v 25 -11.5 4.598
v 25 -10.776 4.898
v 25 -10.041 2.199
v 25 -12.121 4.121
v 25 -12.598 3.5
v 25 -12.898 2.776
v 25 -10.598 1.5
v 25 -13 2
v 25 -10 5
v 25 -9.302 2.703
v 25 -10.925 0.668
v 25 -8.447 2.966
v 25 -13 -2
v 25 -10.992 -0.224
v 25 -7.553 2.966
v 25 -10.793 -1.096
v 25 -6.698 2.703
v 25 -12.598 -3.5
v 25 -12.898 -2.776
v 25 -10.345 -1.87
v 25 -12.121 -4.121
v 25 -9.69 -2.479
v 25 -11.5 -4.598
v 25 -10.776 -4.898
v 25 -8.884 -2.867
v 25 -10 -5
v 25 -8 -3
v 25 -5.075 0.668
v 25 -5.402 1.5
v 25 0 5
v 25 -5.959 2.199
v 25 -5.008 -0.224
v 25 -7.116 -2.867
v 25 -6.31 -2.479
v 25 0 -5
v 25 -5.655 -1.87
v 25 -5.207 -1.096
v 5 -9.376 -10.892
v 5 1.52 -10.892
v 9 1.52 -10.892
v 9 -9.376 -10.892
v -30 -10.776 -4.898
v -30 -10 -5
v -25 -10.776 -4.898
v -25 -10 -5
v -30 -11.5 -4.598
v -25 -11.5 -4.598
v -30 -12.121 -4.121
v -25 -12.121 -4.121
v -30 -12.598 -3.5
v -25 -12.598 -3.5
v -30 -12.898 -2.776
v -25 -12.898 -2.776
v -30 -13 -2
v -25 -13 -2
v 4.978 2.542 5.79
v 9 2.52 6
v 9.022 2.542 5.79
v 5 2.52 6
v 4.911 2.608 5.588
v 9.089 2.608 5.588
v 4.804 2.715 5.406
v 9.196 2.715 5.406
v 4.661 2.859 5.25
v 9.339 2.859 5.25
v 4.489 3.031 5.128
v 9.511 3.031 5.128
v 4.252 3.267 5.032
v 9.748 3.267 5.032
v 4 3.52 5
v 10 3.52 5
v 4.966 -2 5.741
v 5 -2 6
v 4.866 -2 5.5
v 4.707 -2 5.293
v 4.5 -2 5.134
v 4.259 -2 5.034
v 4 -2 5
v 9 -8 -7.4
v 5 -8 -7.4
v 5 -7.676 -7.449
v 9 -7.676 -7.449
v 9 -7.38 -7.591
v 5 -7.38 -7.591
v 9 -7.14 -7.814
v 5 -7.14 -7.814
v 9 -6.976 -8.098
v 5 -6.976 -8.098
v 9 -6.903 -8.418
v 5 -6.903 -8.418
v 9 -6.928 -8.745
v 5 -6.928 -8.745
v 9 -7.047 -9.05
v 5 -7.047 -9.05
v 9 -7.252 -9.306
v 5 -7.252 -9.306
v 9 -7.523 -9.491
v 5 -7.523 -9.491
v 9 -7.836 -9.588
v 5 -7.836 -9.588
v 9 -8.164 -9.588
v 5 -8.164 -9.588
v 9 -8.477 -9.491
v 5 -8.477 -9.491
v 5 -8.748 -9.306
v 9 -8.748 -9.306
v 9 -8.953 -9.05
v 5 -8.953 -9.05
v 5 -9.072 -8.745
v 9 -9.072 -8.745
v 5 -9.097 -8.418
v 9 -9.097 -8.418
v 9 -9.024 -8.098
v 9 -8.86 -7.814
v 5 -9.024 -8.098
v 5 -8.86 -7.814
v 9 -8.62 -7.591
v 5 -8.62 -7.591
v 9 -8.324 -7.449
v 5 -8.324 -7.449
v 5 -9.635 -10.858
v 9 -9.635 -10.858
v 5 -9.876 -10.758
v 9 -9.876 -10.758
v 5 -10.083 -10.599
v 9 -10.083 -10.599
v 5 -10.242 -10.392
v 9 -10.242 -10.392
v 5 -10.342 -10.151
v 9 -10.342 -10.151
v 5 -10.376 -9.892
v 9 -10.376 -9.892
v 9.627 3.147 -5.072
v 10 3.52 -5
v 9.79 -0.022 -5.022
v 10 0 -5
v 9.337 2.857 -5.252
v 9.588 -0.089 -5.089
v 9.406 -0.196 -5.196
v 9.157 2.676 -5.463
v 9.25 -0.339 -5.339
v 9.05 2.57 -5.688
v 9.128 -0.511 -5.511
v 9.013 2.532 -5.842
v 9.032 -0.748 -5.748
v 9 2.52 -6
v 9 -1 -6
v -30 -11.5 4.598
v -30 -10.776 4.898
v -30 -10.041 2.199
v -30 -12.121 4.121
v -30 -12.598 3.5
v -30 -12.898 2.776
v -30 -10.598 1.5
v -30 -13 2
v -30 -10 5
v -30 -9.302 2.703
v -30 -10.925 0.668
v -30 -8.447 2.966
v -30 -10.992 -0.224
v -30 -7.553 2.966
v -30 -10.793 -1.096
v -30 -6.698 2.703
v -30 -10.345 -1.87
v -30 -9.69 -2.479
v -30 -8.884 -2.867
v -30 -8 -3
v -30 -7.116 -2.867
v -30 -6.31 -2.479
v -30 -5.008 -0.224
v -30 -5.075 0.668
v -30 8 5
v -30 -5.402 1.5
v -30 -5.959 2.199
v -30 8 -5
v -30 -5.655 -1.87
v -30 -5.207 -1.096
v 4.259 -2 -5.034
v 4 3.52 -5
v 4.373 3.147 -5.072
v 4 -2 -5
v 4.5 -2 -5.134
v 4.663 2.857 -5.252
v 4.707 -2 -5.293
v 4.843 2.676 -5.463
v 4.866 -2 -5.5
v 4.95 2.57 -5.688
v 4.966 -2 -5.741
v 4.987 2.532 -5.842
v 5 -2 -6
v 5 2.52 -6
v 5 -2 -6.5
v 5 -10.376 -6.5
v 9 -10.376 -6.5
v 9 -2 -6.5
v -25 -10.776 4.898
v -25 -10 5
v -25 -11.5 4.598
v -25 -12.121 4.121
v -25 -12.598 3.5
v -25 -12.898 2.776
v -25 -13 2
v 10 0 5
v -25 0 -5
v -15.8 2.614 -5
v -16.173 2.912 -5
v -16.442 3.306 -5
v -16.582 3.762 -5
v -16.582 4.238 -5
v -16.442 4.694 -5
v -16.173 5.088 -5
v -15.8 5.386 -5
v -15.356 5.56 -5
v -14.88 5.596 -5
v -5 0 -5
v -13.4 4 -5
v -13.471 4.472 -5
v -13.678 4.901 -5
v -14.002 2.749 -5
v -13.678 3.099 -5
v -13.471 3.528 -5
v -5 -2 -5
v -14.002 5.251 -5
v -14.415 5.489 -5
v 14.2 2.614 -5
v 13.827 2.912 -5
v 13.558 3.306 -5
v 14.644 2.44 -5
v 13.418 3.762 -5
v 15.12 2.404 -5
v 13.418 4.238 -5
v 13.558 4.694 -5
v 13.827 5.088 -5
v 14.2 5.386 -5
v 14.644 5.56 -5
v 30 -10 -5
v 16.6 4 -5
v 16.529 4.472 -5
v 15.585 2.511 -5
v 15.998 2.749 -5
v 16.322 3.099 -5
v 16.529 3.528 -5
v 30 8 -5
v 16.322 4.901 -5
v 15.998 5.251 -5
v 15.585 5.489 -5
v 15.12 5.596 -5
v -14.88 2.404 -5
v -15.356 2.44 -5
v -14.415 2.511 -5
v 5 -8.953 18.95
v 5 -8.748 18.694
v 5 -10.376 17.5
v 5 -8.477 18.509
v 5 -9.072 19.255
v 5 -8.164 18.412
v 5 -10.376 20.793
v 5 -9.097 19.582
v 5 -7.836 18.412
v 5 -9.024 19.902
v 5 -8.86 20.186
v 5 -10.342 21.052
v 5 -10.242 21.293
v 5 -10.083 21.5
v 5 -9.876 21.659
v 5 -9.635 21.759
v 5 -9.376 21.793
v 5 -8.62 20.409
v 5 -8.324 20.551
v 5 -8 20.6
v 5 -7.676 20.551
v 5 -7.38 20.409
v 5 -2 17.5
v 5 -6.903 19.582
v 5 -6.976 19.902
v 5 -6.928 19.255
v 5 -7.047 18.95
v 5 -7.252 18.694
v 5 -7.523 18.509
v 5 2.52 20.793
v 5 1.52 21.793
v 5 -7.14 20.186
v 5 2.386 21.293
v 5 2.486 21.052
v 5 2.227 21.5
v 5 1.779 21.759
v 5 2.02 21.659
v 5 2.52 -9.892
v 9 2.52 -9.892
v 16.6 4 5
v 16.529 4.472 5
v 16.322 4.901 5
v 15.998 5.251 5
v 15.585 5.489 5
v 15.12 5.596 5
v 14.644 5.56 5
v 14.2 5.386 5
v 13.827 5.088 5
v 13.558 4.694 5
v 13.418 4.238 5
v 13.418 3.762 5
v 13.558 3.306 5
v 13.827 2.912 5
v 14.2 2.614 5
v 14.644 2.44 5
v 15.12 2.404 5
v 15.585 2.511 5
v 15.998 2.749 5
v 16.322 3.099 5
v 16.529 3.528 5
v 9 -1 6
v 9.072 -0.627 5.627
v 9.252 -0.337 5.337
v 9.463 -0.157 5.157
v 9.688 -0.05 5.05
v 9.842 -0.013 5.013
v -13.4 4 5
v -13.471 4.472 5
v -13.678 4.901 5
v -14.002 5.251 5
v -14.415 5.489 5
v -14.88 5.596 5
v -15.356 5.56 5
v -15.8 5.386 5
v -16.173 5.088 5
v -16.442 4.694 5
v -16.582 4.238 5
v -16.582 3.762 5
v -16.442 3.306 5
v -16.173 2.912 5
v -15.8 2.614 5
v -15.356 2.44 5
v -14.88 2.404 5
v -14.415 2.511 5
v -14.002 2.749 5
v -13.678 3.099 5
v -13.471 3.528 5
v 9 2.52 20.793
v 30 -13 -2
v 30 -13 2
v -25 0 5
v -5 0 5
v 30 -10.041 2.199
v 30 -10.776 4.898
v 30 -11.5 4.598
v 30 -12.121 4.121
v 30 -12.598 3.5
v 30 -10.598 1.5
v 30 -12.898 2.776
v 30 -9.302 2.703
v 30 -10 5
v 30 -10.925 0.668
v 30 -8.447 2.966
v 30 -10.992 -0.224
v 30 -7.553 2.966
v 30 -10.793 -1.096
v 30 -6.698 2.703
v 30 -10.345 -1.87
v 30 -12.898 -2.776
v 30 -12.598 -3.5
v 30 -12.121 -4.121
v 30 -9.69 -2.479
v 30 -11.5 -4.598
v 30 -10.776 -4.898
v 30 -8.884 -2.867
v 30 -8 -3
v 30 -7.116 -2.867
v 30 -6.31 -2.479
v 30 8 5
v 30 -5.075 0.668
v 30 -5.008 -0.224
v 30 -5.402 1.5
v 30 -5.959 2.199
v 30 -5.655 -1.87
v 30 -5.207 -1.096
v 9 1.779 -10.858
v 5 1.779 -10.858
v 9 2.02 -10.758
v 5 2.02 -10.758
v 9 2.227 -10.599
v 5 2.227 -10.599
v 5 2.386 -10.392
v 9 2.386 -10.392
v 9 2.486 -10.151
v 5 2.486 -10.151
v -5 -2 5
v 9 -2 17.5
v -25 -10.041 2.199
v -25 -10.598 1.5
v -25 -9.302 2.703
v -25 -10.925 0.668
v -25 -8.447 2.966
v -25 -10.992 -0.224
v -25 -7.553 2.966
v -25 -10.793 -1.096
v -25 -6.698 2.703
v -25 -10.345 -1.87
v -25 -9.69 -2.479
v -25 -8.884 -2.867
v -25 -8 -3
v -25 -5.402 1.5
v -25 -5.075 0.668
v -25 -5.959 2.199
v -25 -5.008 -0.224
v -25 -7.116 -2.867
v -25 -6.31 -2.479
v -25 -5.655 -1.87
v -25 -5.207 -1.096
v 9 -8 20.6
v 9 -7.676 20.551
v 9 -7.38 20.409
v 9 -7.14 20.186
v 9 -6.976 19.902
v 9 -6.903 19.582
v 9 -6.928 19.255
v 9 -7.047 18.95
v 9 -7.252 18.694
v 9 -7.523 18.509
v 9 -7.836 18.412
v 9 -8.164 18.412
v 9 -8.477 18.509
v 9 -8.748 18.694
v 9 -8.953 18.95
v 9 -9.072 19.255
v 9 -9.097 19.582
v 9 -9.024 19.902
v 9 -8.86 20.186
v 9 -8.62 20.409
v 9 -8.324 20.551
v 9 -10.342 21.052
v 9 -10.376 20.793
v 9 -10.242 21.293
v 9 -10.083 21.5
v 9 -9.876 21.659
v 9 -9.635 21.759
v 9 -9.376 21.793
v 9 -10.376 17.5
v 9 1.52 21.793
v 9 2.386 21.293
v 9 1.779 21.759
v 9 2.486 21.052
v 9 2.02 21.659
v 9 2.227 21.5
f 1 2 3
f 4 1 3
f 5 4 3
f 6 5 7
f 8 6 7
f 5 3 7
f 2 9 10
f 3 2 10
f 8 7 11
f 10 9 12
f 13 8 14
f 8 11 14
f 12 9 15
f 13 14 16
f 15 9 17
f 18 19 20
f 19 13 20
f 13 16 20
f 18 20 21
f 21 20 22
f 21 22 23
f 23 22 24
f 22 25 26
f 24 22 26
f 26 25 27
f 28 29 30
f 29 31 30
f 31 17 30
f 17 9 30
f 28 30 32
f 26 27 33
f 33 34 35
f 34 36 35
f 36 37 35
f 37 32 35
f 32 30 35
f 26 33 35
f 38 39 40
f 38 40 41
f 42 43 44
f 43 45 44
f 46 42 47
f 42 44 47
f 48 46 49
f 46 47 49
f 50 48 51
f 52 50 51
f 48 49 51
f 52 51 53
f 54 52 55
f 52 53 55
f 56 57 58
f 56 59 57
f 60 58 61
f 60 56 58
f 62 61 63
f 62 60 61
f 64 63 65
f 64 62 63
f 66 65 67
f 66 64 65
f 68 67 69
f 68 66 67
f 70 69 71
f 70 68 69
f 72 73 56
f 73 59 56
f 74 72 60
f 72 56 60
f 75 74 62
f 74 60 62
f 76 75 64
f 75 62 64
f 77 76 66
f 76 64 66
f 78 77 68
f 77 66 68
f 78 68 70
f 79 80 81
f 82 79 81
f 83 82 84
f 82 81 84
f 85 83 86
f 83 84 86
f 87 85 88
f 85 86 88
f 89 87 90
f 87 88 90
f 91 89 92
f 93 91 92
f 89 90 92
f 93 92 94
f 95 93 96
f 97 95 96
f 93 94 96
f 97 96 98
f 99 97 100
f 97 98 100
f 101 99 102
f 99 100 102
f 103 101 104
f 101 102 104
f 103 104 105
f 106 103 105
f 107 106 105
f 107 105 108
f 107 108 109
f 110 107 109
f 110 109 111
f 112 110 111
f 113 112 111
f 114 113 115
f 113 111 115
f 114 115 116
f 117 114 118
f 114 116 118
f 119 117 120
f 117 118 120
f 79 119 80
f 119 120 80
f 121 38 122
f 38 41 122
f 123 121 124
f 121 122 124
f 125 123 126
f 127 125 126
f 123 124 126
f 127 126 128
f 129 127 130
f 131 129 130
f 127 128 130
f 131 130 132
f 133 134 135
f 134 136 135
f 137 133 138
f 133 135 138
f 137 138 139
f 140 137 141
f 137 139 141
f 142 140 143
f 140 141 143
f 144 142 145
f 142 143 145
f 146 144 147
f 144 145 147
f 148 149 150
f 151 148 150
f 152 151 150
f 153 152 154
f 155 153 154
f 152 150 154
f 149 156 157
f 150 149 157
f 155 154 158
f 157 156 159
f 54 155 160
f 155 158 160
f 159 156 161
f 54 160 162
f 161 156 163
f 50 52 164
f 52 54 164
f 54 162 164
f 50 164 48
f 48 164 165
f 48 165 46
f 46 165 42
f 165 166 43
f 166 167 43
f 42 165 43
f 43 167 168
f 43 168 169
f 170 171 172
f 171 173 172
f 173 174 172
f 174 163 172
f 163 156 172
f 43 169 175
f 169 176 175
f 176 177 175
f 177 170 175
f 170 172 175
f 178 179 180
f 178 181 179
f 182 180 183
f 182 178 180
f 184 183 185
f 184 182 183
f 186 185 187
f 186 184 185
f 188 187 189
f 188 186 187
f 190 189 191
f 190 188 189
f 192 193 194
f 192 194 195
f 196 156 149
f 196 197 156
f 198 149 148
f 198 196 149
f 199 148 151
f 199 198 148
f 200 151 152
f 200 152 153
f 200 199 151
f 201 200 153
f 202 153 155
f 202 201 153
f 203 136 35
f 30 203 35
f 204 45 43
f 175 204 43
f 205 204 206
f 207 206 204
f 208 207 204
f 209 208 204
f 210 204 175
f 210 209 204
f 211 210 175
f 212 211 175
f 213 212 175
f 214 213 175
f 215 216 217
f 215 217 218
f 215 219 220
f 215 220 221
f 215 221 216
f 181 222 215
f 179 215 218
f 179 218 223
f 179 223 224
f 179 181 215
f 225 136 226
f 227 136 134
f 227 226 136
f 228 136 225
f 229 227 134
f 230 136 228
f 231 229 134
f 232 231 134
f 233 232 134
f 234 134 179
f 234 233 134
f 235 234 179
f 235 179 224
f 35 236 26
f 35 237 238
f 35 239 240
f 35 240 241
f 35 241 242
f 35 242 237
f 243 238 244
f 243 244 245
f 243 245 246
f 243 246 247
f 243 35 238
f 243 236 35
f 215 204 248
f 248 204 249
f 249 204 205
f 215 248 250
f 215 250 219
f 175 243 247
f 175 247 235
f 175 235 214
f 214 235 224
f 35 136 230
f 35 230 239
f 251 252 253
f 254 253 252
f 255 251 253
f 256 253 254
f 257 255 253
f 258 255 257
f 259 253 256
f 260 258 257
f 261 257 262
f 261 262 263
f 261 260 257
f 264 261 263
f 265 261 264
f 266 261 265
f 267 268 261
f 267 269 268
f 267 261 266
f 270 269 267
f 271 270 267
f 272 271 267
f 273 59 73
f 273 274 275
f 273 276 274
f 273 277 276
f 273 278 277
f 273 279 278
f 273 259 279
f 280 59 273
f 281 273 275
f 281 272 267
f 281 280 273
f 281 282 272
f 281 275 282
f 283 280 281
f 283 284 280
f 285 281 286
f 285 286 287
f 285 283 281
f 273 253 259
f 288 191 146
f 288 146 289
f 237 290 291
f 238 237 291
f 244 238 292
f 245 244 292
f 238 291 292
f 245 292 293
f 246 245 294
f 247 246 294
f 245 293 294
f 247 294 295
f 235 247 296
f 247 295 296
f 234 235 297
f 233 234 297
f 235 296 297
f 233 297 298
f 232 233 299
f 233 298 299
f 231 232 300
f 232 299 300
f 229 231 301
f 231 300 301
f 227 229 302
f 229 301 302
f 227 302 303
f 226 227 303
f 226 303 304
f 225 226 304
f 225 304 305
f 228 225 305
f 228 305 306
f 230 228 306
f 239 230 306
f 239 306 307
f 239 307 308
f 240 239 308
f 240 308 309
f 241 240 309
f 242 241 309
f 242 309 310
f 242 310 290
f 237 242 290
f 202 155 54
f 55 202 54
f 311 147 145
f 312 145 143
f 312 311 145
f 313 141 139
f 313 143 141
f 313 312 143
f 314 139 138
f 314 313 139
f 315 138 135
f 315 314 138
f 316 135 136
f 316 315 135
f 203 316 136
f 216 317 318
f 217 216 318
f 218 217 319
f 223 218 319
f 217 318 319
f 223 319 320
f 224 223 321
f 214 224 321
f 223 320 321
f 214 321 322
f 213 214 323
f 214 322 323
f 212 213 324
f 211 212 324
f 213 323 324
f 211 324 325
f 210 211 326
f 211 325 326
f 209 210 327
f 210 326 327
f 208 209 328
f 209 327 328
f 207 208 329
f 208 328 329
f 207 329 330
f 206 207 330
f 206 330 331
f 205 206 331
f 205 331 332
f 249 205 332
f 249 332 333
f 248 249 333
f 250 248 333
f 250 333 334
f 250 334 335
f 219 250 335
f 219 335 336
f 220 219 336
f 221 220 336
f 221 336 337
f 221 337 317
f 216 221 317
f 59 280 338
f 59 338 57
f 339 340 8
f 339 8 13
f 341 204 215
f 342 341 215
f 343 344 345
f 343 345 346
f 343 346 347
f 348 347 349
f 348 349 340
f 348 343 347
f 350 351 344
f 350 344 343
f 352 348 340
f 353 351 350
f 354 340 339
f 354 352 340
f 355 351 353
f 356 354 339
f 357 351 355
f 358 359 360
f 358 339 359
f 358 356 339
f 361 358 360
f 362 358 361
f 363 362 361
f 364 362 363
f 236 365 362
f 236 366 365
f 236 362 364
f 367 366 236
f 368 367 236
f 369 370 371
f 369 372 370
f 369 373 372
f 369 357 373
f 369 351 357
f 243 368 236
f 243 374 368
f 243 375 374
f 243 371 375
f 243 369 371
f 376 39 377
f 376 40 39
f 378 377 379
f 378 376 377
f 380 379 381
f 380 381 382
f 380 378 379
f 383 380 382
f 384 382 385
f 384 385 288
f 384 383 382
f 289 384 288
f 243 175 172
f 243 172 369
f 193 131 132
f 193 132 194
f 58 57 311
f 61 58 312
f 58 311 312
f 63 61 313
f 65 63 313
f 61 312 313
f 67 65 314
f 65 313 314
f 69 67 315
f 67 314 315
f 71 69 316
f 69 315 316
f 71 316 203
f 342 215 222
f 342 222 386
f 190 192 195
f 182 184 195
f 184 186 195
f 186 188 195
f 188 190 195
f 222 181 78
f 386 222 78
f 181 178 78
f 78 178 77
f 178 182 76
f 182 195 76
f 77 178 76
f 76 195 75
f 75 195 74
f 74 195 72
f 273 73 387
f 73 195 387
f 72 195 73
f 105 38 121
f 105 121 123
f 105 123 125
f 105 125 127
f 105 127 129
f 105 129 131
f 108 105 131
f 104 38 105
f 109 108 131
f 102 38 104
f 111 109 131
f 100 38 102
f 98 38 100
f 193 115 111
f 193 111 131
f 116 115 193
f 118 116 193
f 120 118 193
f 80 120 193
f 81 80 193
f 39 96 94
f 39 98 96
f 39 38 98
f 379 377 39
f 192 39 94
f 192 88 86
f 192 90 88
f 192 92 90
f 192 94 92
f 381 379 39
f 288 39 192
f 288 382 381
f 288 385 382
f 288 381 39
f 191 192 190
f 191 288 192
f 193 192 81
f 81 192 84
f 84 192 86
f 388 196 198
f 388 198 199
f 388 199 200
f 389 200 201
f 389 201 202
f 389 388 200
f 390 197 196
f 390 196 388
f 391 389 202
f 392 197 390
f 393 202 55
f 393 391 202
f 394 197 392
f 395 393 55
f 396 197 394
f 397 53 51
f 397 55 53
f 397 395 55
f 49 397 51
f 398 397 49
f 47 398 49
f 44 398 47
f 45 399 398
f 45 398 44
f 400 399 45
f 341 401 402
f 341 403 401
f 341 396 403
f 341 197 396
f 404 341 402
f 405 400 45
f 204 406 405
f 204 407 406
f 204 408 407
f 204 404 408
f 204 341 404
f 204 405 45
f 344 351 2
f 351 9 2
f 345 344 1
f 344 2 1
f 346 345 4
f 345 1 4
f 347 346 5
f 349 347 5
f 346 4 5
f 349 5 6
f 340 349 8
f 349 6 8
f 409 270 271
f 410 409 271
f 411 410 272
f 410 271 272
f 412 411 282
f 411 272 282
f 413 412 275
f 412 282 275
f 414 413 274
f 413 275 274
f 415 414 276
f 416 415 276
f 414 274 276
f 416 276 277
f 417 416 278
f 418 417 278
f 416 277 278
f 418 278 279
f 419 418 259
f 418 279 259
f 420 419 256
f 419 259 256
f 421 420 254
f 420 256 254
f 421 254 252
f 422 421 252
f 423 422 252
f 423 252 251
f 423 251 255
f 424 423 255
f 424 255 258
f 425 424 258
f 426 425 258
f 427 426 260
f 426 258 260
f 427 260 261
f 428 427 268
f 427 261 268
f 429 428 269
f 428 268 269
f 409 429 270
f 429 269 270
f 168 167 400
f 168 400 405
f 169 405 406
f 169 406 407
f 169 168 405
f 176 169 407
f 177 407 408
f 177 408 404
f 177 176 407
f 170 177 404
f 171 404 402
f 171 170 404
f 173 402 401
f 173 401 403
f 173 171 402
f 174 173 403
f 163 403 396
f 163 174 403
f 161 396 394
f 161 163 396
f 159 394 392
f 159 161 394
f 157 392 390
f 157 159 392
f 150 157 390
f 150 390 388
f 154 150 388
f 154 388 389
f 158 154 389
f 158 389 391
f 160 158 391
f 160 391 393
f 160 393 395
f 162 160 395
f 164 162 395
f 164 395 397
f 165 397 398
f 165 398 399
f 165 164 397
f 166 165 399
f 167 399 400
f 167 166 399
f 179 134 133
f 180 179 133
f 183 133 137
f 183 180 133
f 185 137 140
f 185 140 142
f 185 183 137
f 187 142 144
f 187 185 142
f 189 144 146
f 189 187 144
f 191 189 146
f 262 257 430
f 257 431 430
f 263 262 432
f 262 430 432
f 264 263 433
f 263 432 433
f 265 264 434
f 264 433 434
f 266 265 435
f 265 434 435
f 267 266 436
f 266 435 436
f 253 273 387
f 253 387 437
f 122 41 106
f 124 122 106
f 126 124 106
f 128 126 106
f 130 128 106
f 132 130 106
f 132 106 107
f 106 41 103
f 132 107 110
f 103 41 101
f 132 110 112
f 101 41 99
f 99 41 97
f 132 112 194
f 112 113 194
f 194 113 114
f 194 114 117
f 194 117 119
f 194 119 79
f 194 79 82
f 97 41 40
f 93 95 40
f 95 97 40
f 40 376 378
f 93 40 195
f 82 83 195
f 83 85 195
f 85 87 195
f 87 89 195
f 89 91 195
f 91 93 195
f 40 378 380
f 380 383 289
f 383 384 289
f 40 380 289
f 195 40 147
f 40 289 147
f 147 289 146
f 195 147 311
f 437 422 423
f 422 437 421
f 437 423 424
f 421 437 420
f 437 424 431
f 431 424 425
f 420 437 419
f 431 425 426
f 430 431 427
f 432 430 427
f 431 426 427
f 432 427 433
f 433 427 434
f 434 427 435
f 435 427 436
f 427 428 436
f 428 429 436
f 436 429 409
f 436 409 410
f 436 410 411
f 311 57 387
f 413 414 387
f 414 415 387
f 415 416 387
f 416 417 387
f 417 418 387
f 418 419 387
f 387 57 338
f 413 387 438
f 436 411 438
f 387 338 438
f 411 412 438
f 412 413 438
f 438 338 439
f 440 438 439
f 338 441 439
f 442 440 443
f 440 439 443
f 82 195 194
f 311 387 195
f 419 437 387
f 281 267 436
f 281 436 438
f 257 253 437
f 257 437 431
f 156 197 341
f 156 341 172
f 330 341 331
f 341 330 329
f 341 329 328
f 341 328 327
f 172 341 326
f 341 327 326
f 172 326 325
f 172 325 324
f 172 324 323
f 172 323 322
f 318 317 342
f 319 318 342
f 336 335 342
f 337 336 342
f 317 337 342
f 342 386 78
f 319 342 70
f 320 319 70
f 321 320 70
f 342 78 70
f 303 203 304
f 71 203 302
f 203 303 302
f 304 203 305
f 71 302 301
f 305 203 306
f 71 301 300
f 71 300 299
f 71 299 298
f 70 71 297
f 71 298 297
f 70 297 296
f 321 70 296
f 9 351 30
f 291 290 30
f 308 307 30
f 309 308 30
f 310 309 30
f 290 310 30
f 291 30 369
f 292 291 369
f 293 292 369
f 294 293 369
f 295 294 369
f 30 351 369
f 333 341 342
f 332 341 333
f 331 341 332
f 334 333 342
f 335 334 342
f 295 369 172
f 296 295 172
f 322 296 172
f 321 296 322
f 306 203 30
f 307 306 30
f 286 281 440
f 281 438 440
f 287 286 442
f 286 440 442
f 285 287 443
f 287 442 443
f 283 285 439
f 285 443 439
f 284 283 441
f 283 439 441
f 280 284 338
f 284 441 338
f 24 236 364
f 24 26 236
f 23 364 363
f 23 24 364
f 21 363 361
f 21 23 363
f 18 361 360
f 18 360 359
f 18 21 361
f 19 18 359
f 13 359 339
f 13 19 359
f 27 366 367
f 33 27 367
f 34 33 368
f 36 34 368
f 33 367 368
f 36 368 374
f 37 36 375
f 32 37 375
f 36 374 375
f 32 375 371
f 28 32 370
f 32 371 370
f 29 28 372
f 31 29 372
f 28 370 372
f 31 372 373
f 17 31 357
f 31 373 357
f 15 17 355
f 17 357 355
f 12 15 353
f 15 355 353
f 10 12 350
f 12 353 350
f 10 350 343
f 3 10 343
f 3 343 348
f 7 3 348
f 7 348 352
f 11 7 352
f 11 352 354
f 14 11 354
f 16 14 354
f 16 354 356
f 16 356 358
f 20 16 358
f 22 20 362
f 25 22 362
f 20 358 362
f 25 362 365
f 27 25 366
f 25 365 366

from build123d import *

# Parameters (mm, degrees)
SKETCH_1_W               = 60
SKETCH_1_H               = 10
EXTRUDE_1_DEPTH          = 8
SKETCH_2_W               = 10
SKETCH_2_H               = 21
SKETCH_2_R               = 3
EXTRUDE_2_DEPTH          = 5
FILLET_1_R               = 3
SKETCH_3_R               = 1.1
EXTRUDE_3_DEPTH          = 4
SKETCH_5_W               = 10
SKETCH_5_H               = 2
EXTRUDE_4_DEPTH          = 10
FILLET_4_R               = 1
SKETCH_4_R               = 1.6
CUT_EXTRUDE_1_DEPTH      = 17.792928464
CUT_EXTRUDE_1_DEPTH_BACK = 16.892331711


with BuildPart() as part:
    # 草图1 → 凸台-拉伸1 (new body)
    with BuildSketch(Plane(origin=(0, 0, 0), x_dir=(1, 0, 0), z_dir=(0, 1, 0))):
        Rectangle(SKETCH_1_W, SKETCH_1_H)
    extrude(amount=EXTRUDE_1_DEPTH)

    # 草图2 → 凸台-拉伸2 (add)
    with BuildSketch(Plane(origin=(30, 0, 0), x_dir=(0, 0, -1), z_dir=(1, 0, 0))):
        with Locations((0, -2.5)):
            Rectangle(SKETCH_2_W, SKETCH_2_H)
        with Locations((0, -8)):
            Circle(SKETCH_2_R, mode=Mode.SUBTRACT)
    extrude_2 = extrude(amount=-EXTRUDE_2_DEPTH)

    # 镜向1: 凸台-拉伸2 across plane
    add(extrude_2.mirror(Plane(origin=(0, 0, 0), x_dir=(0, 0, 1), z_dir=(1, 0, 0))))

    # 圆角1
    fillet_1_edges = [part.edges().sort_by_distance(p)[0] for p in [
        (27.5, -13, 5),
        (27.5, -13, -5),
        (-27.5, -13, -5),
        (-27.5, -13, 5),
    ]]
    fillet(fillet_1_edges, radius=FILLET_1_R)

    # 草图3 → 凸台-拉伸3 (add)
    with BuildSketch(Plane.ZY.offset(-5)):
        Polygon((-6.5, -2), (17.5, -2), (17.5, -8), (17.5, -10.376383694), (21.792928464, -10.376383694), (21.792928464, 2.519827065), (-10.892331711, 2.519827065), (-10.892331711, -10.376383694), (-6.5, -10.376383694), (-6.5, -8), align=None)
        with Locations((-8.5, -8)):
            Circle(SKETCH_3_R, mode=Mode.SUBTRACT)
        with Locations((19.5, -8)):
            Circle(SKETCH_3_R, mode=Mode.SUBTRACT)
    extrude(amount=-EXTRUDE_3_DEPTH)

    # 草图5 → 凸台-拉伸4 (add)
    with BuildSketch(Plane.ZY.offset(-5)):
        with Locations((0, -1)):
            Rectangle(SKETCH_5_W, SKETCH_5_H)
    extrude(amount=EXTRUDE_4_DEPTH)

    # 圆角4
    fillet_4_edges = [part.edges().sort_by_distance(p)[0] for p in [
        (5, 0.259913532, -5),
        (7, 2.519827065, -5),
        (9, 1.259913532, -5),
        (7, 2.519827065, -10.892331711),
        (5, 0.259913532, 5),
        (7, -10.376383694, -10.892331711),
        (7, 2.519827065, 5),
        (7, 2.519827065, 21.792928464),
        (7, -10.376383694, 21.792928464),
        (9, 1.259913532, 5),
        (9, 0, 0),
    ]]
    fillet(fillet_4_edges, radius=FILLET_4_R)

    # 草图4 → 切除-拉伸1 (cut, two sides)
    with BuildSketch(Plane.XY.offset(5)) as cut_extrude_1_sk:
        with Locations((-15, 4)):
            Circle(SKETCH_4_R)
        with Locations((15, 4)):
            Circle(SKETCH_4_R)
    extrude(amount=CUT_EXTRUDE_1_DEPTH, mode=Mode.SUBTRACT)
    extrude(cut_extrude_1_sk.sketch, amount=-CUT_EXTRUDE_1_DEPTH_BACK, mode=Mode.SUBTRACT)


solid = part.part
